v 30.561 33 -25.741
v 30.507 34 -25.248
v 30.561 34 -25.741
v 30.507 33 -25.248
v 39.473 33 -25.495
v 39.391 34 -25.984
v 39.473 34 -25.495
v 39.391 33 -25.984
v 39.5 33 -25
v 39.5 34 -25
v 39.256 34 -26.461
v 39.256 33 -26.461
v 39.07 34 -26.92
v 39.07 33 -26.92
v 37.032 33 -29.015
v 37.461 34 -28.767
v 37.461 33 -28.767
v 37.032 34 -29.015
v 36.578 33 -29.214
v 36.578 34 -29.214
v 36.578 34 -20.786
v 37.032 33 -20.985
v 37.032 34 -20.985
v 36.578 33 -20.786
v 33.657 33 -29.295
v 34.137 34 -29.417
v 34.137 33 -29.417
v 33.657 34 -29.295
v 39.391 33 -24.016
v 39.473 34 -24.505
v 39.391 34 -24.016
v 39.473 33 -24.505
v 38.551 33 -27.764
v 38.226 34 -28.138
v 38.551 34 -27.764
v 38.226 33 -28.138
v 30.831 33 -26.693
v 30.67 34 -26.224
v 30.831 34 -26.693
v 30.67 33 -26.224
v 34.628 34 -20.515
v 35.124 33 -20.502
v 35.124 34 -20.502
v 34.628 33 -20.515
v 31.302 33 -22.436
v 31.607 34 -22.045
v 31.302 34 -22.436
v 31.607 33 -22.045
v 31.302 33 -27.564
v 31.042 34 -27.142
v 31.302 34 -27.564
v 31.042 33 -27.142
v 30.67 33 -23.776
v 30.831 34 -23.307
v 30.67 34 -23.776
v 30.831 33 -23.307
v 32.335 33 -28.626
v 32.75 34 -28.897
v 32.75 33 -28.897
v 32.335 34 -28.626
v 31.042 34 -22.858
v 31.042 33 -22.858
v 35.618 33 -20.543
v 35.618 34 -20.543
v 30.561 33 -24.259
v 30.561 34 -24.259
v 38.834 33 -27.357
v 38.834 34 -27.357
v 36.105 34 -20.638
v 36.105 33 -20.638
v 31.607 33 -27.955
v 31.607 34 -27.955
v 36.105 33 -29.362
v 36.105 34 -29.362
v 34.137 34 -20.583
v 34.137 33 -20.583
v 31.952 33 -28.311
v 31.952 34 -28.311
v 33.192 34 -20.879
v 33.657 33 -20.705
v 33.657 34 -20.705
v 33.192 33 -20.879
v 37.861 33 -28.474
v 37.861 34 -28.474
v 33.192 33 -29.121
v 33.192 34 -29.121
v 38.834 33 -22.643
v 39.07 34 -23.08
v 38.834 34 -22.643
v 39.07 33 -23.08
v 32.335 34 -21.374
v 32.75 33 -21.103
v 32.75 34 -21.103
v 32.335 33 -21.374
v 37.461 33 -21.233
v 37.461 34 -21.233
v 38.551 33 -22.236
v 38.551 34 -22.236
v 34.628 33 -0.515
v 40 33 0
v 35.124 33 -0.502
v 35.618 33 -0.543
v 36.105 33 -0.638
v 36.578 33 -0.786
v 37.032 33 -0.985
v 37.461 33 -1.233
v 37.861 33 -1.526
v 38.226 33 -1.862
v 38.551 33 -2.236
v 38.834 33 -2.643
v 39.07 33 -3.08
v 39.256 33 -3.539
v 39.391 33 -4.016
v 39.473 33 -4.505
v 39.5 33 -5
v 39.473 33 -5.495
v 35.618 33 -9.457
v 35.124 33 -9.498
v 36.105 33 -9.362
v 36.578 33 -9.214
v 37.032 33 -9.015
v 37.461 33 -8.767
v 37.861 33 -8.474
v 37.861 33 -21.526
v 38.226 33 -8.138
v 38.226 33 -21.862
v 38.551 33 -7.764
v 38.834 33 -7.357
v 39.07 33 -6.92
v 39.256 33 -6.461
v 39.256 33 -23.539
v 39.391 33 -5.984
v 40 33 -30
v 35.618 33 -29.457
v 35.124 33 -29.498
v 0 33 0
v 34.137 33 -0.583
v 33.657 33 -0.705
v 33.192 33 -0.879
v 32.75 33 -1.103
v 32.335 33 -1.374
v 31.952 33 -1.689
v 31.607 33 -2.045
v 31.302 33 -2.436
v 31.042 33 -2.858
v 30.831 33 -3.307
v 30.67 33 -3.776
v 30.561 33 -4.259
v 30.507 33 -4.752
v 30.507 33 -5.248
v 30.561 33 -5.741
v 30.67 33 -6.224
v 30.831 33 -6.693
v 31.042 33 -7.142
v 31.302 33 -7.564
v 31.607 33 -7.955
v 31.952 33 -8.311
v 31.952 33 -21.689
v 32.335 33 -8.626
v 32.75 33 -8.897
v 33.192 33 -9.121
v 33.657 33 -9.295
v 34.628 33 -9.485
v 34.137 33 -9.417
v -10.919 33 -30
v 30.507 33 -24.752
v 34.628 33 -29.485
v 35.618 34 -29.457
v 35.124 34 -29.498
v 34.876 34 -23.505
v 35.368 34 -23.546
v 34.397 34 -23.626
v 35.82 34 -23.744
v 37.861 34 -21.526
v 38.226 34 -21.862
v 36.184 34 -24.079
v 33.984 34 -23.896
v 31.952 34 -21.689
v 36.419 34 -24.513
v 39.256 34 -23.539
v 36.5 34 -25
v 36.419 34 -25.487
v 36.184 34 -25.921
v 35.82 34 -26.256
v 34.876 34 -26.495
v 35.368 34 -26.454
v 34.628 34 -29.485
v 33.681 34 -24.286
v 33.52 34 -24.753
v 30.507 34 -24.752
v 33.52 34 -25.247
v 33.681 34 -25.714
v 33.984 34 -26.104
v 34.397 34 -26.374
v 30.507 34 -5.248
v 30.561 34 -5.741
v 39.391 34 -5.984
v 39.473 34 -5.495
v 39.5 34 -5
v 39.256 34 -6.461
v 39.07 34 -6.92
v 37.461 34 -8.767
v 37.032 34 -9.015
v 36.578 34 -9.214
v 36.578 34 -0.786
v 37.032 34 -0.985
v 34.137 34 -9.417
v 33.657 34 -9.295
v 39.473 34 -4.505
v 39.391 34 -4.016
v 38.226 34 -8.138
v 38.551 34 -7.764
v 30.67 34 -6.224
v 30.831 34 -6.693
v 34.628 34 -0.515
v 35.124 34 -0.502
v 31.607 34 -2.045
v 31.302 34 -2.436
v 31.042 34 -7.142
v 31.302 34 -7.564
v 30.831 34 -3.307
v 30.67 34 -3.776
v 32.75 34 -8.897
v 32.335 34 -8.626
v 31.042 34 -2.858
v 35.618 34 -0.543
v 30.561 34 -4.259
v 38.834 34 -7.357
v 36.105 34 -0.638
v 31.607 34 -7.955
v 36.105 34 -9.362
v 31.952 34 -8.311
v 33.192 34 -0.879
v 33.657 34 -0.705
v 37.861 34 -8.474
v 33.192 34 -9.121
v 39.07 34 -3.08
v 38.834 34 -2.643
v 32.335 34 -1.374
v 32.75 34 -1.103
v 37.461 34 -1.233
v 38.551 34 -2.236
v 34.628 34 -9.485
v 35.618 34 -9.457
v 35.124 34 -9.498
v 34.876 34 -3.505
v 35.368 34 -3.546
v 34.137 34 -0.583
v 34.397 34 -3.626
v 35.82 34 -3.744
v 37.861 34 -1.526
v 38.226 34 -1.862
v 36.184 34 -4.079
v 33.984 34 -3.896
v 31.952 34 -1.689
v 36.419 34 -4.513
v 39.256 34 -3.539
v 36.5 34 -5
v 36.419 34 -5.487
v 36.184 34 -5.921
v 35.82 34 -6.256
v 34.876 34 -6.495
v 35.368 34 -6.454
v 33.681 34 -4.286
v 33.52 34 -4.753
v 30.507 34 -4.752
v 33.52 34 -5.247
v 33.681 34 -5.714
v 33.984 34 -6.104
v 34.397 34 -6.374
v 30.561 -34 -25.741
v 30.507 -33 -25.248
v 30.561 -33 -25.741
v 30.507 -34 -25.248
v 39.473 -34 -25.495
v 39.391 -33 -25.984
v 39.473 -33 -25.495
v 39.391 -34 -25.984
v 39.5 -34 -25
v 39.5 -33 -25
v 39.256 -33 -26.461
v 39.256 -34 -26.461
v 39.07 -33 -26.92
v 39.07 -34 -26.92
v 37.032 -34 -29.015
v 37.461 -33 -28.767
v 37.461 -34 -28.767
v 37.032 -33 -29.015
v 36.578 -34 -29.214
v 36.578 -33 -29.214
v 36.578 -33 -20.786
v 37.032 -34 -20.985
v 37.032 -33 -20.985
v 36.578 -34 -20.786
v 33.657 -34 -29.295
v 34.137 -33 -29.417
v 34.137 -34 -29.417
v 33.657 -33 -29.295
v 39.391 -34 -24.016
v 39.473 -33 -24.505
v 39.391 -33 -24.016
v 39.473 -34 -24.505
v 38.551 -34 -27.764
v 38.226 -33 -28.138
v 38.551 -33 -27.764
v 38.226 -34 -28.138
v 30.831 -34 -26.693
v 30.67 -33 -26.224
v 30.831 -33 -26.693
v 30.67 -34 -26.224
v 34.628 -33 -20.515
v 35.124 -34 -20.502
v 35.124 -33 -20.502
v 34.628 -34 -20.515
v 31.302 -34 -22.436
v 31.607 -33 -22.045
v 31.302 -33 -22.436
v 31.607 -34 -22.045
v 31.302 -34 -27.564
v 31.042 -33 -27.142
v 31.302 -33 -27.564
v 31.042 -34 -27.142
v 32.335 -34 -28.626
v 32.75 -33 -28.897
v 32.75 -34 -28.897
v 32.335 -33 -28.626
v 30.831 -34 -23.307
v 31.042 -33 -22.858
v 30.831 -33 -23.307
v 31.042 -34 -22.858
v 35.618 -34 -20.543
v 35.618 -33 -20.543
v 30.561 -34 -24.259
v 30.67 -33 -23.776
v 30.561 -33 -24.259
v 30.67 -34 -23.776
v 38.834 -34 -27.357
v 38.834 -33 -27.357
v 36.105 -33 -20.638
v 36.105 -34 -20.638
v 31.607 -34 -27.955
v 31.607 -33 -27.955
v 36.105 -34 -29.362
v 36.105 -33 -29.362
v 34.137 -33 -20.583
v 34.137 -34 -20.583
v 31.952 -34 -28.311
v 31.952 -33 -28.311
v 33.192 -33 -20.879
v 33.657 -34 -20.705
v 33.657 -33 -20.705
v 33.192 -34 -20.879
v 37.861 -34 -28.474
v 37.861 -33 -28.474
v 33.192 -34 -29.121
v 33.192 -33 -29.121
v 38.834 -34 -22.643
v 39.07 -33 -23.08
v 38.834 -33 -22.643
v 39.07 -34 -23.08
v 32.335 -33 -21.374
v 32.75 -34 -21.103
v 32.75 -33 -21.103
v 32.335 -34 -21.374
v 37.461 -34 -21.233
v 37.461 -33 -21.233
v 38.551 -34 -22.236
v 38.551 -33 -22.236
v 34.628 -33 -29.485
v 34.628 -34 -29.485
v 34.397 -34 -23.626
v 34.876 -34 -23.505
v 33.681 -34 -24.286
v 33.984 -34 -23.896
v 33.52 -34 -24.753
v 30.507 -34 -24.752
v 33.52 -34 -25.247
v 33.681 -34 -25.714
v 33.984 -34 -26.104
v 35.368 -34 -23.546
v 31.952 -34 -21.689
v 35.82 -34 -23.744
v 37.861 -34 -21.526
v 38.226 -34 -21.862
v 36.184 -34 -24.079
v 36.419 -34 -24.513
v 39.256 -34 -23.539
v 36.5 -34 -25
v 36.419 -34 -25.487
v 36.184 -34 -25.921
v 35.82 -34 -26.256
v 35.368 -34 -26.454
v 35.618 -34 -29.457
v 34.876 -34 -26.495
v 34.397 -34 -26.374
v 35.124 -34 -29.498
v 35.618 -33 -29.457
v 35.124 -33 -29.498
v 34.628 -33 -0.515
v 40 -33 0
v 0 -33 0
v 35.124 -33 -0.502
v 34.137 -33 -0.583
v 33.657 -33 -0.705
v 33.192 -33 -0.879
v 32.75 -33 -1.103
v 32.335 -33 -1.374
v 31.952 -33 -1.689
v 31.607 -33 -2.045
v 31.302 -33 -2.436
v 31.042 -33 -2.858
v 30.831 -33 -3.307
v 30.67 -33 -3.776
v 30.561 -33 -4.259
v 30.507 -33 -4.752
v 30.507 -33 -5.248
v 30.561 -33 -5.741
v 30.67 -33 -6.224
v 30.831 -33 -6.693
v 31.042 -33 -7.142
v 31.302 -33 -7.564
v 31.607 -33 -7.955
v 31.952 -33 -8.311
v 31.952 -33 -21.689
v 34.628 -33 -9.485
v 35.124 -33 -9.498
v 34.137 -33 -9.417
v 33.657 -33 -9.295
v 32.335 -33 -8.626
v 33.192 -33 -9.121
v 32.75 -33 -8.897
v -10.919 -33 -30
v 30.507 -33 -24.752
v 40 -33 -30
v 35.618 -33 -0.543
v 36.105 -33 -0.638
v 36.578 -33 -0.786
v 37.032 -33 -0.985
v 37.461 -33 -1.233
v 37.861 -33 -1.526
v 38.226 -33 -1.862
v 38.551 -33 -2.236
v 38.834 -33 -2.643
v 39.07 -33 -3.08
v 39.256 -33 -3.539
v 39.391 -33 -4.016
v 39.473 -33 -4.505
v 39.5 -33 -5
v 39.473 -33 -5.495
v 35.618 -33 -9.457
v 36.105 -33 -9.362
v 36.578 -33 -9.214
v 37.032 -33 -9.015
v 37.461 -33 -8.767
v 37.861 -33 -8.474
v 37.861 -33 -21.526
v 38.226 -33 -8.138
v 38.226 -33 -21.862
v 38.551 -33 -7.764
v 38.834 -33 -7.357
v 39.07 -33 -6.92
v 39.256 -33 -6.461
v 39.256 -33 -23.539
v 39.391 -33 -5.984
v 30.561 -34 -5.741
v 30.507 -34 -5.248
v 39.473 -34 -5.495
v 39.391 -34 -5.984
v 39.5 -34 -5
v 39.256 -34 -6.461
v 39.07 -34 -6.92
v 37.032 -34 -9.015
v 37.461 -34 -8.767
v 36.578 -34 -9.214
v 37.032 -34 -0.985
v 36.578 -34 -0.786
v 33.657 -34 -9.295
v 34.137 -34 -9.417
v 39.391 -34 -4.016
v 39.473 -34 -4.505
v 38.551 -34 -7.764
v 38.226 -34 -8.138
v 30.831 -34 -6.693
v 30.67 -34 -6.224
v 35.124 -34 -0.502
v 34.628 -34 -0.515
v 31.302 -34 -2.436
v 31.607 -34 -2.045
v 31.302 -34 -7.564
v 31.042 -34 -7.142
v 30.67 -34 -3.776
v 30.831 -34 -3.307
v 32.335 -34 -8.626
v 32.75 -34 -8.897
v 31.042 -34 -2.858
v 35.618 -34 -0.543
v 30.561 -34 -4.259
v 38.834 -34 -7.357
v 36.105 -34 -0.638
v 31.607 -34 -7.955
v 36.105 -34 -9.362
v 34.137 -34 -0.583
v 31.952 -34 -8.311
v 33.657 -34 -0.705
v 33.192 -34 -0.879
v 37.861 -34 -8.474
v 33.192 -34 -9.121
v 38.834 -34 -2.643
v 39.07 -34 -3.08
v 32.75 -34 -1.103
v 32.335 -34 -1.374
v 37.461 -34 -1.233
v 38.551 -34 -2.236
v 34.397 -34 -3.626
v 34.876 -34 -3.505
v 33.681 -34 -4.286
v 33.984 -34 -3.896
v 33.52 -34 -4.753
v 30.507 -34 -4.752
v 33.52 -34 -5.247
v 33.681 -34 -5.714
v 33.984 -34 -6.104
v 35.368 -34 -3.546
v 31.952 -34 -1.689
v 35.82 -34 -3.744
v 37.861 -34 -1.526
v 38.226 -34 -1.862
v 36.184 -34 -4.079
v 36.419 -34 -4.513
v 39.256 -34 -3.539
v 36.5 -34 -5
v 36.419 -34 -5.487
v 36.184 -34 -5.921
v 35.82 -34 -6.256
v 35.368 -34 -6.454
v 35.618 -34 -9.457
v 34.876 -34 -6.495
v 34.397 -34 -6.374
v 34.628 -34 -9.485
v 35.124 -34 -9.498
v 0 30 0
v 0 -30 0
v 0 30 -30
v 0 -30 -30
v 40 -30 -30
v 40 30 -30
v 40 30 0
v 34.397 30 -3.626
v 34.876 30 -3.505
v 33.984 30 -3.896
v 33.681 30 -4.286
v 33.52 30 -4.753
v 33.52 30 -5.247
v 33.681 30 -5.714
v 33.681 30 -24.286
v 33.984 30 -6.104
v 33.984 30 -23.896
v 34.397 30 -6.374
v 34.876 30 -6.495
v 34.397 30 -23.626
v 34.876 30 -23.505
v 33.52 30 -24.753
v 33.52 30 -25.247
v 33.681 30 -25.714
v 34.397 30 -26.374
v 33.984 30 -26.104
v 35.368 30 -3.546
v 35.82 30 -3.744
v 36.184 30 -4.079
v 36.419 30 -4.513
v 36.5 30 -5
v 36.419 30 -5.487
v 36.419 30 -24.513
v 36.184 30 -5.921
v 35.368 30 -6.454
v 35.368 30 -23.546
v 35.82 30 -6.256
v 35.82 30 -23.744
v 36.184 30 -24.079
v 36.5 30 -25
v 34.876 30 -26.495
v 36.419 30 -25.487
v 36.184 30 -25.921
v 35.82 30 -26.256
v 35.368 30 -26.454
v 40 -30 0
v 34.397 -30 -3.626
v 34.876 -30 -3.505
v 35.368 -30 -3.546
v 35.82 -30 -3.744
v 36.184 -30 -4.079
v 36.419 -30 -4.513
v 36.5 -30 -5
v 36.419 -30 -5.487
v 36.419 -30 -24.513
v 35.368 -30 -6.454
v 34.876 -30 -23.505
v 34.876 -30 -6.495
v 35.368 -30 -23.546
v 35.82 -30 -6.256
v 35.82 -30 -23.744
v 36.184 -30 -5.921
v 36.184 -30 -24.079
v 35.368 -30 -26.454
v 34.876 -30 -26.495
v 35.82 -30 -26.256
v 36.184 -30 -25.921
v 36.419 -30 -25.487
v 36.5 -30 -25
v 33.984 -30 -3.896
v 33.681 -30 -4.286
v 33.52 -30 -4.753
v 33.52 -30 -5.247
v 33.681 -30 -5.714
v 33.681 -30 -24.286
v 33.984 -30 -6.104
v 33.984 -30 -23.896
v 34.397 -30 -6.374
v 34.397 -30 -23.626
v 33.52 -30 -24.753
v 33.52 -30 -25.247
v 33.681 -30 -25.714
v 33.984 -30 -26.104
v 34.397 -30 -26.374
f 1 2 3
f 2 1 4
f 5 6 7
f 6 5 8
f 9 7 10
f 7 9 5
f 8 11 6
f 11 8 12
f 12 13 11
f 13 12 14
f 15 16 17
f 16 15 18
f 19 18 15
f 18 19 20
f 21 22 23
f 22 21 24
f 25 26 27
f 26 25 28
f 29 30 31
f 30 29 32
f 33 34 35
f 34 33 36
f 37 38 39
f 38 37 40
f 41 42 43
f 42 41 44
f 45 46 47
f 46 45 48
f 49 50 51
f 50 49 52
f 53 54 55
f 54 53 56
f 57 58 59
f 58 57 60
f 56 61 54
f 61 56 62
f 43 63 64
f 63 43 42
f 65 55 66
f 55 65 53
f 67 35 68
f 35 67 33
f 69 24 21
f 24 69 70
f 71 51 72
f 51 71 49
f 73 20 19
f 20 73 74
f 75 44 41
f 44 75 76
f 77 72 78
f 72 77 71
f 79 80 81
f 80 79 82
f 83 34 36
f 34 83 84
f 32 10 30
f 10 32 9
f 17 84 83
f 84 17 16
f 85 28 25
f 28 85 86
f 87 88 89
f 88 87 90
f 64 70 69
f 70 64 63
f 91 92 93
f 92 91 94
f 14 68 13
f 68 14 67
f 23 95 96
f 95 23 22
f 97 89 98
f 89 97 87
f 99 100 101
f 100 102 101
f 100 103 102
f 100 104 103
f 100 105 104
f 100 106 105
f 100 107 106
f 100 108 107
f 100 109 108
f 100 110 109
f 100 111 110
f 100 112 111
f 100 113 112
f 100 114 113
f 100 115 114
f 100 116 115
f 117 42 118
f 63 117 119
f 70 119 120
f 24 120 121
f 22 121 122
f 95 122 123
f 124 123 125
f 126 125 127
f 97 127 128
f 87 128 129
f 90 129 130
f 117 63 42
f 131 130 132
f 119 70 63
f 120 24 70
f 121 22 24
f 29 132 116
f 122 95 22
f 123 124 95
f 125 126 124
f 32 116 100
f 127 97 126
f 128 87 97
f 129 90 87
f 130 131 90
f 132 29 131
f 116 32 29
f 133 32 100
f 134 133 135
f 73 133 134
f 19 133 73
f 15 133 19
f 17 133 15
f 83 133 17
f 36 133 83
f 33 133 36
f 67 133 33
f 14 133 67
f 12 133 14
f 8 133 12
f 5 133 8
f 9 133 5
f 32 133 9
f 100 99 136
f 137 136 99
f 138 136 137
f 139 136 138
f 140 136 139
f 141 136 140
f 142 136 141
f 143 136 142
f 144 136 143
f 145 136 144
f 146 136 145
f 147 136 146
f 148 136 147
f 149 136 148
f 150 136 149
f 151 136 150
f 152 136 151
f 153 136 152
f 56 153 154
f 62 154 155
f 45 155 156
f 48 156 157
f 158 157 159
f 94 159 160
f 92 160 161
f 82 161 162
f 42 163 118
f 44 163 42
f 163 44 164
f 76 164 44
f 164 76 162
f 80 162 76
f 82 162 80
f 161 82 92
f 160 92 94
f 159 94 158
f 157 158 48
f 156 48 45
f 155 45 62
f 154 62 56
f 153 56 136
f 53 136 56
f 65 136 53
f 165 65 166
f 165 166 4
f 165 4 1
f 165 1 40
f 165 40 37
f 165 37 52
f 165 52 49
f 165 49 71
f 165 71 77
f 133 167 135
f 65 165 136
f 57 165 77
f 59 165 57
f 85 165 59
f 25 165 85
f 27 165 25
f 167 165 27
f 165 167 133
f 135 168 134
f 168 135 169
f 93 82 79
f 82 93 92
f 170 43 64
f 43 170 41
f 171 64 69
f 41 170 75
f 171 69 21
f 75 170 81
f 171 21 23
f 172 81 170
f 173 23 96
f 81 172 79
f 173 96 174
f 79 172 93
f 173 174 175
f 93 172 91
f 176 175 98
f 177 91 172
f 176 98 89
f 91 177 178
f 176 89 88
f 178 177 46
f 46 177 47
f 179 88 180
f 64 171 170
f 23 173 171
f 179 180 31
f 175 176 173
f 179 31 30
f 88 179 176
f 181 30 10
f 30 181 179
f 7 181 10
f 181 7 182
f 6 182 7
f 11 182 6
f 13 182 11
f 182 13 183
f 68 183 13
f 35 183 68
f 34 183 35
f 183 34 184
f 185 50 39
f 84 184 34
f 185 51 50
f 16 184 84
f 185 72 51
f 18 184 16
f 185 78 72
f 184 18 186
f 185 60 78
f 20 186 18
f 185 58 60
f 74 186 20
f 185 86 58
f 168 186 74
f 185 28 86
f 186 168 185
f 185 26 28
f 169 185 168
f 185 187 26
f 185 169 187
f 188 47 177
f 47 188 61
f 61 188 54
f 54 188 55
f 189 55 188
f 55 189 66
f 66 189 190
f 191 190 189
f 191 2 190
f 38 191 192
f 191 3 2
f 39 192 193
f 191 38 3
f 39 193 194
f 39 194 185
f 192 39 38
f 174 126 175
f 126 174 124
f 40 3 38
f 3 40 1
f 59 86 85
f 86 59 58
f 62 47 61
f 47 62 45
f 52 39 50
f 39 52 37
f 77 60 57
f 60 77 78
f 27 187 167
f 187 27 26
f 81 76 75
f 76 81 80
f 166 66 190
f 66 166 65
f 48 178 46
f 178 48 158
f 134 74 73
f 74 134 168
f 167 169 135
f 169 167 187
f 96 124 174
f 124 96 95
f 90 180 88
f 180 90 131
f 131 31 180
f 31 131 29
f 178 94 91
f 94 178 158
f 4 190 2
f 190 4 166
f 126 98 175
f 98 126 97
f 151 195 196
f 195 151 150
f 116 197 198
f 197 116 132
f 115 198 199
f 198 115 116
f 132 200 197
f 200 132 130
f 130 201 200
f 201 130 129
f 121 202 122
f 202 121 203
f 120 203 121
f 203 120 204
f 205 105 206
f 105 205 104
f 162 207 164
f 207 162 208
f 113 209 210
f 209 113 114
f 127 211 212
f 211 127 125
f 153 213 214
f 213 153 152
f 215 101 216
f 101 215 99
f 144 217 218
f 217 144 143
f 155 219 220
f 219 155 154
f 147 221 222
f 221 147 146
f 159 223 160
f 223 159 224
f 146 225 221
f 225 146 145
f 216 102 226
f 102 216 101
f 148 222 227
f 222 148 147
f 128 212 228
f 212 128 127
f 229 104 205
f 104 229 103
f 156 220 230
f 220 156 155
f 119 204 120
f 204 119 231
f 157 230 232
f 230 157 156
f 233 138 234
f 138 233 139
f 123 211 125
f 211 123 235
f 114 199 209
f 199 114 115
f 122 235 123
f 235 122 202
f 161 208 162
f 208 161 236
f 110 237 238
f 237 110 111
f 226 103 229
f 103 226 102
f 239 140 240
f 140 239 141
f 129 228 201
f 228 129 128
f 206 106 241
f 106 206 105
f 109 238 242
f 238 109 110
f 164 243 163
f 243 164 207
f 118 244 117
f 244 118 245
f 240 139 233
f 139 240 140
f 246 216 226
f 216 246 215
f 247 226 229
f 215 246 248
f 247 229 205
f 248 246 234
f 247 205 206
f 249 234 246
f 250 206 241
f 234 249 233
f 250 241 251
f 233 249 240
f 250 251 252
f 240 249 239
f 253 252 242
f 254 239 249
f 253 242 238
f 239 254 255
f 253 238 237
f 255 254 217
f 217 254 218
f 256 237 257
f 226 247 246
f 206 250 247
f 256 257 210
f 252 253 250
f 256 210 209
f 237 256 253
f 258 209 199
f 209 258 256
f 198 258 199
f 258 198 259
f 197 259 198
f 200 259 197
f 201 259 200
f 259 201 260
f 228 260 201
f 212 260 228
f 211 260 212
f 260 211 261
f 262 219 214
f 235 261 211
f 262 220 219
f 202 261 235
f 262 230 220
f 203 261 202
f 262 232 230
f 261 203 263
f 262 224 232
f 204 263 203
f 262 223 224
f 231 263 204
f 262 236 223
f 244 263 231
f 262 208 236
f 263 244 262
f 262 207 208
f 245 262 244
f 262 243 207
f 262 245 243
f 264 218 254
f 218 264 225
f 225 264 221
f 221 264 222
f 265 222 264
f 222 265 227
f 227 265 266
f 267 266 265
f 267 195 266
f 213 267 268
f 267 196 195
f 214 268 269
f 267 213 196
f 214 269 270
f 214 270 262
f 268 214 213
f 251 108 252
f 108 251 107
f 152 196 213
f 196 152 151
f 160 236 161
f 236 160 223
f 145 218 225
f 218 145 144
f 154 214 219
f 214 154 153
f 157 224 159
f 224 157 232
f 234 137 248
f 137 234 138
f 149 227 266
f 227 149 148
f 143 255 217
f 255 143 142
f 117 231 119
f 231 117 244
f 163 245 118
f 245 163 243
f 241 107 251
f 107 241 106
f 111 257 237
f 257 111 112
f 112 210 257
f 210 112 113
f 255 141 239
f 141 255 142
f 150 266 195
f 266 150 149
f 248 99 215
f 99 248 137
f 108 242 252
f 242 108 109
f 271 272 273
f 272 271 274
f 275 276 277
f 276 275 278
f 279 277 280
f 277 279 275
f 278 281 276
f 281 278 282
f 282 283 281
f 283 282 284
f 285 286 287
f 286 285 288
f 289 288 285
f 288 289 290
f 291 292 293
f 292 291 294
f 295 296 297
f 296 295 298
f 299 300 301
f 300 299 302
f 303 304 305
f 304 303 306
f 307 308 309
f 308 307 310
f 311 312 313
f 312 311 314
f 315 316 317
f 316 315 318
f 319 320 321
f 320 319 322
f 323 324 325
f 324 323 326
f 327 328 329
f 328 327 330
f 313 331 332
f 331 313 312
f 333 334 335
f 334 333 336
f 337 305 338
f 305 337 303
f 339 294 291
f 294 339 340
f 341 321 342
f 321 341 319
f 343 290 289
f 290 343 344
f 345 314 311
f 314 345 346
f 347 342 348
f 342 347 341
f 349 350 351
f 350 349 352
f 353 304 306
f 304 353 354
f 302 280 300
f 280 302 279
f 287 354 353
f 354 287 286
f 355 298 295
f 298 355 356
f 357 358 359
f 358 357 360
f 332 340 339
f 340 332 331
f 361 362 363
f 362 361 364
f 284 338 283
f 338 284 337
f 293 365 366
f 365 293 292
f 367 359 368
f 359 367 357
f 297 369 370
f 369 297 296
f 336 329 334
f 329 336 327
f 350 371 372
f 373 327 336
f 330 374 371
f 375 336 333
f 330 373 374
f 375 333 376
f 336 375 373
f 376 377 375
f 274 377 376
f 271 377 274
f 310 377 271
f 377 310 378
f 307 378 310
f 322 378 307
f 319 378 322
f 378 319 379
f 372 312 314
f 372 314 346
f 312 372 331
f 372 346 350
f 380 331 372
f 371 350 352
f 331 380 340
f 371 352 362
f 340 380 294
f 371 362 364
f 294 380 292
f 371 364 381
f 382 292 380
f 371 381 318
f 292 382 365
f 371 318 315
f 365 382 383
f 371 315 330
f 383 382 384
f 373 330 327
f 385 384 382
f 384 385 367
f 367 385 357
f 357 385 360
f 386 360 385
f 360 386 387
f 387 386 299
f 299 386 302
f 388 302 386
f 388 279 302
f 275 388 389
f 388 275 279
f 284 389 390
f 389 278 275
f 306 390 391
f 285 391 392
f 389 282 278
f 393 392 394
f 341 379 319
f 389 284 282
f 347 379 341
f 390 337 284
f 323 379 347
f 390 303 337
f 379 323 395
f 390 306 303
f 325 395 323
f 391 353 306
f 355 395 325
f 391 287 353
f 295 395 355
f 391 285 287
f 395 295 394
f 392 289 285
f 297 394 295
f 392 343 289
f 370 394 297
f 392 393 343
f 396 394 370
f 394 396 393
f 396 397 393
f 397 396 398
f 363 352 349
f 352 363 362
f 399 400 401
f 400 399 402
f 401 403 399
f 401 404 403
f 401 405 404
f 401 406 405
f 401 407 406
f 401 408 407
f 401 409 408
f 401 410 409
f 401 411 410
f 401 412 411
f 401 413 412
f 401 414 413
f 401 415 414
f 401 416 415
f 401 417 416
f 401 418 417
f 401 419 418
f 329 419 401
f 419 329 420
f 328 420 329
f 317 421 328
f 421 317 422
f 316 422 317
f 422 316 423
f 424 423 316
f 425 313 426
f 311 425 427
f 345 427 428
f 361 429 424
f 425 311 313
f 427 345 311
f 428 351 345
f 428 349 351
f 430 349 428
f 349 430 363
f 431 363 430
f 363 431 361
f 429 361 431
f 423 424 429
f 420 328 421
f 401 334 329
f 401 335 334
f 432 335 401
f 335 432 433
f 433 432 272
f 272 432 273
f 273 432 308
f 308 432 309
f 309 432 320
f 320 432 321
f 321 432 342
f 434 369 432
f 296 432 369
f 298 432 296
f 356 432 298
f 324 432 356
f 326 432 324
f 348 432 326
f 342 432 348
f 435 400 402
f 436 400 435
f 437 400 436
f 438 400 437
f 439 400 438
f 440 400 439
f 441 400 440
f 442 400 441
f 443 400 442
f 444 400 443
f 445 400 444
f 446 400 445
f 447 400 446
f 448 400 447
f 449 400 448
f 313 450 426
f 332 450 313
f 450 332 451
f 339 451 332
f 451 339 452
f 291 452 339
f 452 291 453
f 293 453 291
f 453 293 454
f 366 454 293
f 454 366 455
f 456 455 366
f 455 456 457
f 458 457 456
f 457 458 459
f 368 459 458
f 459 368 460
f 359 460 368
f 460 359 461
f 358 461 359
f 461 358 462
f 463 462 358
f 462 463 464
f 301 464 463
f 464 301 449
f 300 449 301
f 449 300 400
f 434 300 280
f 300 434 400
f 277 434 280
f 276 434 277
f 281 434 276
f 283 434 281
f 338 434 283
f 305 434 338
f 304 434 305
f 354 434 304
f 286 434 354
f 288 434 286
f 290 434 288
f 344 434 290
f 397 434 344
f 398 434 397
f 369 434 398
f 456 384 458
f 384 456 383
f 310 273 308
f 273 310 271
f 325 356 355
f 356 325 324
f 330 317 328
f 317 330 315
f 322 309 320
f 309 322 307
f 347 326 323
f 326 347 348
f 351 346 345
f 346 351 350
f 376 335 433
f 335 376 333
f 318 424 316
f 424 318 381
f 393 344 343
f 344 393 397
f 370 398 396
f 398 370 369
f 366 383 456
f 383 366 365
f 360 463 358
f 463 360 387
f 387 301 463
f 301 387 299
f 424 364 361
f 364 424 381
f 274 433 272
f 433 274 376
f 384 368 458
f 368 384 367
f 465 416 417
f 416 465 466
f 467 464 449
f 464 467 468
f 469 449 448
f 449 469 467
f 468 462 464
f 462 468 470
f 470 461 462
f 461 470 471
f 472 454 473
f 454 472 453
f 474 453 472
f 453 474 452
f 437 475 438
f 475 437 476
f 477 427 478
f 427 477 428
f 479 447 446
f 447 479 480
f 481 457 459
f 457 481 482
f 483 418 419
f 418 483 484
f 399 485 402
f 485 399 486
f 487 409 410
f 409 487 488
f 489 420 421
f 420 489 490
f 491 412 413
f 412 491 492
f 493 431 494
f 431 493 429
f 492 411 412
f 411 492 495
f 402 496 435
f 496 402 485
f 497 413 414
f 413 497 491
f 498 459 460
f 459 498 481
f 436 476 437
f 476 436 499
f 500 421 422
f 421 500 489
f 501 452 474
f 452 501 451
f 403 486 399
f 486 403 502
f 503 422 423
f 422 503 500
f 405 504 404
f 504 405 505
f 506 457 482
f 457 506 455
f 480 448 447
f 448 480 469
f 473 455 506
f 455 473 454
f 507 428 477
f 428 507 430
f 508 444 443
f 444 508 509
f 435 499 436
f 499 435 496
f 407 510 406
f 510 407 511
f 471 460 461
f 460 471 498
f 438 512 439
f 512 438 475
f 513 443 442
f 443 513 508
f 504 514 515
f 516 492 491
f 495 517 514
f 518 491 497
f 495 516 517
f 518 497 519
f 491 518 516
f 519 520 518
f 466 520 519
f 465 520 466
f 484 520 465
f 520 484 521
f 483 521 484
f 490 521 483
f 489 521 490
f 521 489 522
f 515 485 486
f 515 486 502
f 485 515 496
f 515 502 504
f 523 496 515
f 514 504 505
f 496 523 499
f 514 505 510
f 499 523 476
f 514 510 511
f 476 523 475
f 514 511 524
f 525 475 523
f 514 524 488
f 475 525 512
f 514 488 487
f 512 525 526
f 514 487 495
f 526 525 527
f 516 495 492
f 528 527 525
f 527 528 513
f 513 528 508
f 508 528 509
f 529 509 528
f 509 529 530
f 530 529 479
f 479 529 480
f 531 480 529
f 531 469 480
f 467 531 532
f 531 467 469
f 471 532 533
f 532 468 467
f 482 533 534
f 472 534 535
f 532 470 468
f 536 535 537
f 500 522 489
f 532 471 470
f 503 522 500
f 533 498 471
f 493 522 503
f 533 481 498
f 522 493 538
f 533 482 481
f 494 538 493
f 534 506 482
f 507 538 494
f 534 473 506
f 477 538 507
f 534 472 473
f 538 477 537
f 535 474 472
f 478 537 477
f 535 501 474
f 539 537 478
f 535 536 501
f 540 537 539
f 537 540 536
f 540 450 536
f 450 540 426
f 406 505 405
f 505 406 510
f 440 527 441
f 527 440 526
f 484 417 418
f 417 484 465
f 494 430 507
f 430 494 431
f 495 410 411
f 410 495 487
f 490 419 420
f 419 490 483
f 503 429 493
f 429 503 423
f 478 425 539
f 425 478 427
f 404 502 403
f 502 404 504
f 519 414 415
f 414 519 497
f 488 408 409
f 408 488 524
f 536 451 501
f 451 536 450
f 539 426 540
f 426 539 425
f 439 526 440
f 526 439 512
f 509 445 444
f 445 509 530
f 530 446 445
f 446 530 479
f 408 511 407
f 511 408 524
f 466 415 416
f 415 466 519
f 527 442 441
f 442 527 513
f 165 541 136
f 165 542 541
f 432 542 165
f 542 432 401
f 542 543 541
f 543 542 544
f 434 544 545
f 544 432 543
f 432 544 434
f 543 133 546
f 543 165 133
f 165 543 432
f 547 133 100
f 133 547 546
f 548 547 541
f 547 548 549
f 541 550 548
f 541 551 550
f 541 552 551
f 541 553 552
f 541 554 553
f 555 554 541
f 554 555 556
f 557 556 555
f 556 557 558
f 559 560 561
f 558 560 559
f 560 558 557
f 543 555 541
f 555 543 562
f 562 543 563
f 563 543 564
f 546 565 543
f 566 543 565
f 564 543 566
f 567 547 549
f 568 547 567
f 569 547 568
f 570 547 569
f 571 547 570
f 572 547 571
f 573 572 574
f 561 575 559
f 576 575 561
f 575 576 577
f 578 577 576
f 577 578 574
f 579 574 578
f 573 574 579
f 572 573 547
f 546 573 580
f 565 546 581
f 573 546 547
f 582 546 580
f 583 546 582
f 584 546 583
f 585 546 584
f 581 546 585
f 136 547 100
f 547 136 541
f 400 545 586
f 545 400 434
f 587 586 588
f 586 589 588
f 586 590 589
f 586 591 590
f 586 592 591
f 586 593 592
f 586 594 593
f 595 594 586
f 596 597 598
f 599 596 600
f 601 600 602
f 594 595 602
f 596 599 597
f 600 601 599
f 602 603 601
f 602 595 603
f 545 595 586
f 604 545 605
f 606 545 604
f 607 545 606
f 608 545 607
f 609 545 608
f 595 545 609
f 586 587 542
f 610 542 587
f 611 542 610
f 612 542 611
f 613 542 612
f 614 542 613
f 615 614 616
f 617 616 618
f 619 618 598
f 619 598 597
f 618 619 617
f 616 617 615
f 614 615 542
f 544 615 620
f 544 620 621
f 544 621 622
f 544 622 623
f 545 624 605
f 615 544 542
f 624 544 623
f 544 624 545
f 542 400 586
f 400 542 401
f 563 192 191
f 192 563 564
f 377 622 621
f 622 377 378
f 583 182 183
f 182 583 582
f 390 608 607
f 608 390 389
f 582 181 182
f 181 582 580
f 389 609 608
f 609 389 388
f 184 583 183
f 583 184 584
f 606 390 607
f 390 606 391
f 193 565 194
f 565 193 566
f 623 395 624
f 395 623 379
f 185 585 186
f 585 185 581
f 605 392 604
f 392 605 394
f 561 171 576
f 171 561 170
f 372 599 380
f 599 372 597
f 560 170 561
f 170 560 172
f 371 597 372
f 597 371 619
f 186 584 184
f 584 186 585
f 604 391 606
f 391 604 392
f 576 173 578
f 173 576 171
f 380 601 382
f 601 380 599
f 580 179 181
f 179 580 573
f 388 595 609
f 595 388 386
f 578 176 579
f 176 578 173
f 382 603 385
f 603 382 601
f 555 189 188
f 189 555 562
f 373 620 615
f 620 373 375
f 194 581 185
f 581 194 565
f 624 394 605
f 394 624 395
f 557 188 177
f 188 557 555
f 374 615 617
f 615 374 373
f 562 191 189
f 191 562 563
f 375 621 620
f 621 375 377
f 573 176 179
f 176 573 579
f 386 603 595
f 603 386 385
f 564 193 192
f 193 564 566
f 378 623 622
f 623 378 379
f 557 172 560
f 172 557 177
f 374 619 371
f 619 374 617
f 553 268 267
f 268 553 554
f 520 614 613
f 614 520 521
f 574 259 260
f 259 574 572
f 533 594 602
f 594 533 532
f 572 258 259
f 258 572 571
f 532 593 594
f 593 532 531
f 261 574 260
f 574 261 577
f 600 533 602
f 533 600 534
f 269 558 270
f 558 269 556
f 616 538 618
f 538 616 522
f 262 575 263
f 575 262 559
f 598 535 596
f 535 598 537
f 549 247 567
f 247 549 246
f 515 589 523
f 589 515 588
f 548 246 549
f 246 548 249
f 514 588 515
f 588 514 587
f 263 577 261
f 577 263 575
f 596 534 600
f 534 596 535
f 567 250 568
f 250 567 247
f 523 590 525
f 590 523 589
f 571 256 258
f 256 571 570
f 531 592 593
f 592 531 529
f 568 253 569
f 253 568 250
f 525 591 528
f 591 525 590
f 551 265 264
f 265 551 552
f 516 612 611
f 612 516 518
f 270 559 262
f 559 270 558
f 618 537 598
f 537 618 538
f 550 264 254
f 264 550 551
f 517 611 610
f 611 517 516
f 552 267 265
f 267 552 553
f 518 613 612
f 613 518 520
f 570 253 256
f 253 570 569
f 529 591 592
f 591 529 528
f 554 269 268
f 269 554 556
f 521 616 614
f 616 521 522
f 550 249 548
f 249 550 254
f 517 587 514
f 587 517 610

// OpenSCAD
bsl=1/100;
$fa=1/2;
$fs=1/2;
hor_c=60;
ver_c=40;
length=30;
angle=20;
wall=3;
bearing_offset=5;
hole=3;
bearing_id=5;
bearing_h=4;
bearing_extra_h=1;
bearing_extra_w=2;
part="main";//[main,bearing_holder,NOSTL_all]
module main() {
  difference() {
    union() {
      linear_extrude(height=hor_c+2*wall,center=true) {
        polygon([[0,0],[0,length],[-length*tan(angle),length]]);
      }
      translate([0,0,hor_c/2])cube([ver_c,length,wall]);
      translate([0,0,-hor_c/2-wall])cube([ver_c,length,wall]);
      for (tr=[[ver_c-bearing_offset,length-bearing_offset,hor_c/2+wall],
               [ver_c-bearing_offset,bearing_offset,hor_c/2+wall],
               [ver_c-bearing_offset,length-bearing_offset,-hor_c/2-wall-bearing_extra_h],
               [ver_c-bearing_offset,bearing_offset,-hor_c/2-wall-bearing_extra_h]
              ]) translate(tr) cylinder(d=bearing_id+2*bearing_extra_w,h=bearing_extra_h);
    }
    for (tr=[[ver_c-bearing_offset,length-bearing_offset,0],
             [ver_c-bearing_offset,bearing_offset,0]
            ]) translate(tr) cylinder(d=hole,h=hor_c+2*bearing_extra_h+2*wall+bsl,center=true);

  }
}
module bearing_holder() {
  difference() {
    union() {
      cylinder(d=bearing_id+2*bearing_extra_h,h=wall);
      cylinder(d=bearing_id,h=bearing_h+wall);
    }
    translate([0,0,-bsl]) cylinder(h=bearing_h+wall+2*bsl,d=hole);
  }
}
if (part=="main") {rotate([-90,0,0])main();}
if (part=="bearing_holder") {bearing_holder();}
if (part=="NOSTL_all") {
  rotate([0,90,0]) main();
  rotate([0,90,0]) for (m=[[0,0,0],[0,0,1]]) mirror(m)
  for (tr=[[ver_c-bearing_offset,length-bearing_offset,-hor_c/2-2*wall-bearing_h-bearing_extra_h-1],
           [ver_c-bearing_offset,bearing_offset,-hor_c/2-2*wall-bearing_h-bearing_extra_h-1],
          ]) translate(tr) bearing_holder();
}
